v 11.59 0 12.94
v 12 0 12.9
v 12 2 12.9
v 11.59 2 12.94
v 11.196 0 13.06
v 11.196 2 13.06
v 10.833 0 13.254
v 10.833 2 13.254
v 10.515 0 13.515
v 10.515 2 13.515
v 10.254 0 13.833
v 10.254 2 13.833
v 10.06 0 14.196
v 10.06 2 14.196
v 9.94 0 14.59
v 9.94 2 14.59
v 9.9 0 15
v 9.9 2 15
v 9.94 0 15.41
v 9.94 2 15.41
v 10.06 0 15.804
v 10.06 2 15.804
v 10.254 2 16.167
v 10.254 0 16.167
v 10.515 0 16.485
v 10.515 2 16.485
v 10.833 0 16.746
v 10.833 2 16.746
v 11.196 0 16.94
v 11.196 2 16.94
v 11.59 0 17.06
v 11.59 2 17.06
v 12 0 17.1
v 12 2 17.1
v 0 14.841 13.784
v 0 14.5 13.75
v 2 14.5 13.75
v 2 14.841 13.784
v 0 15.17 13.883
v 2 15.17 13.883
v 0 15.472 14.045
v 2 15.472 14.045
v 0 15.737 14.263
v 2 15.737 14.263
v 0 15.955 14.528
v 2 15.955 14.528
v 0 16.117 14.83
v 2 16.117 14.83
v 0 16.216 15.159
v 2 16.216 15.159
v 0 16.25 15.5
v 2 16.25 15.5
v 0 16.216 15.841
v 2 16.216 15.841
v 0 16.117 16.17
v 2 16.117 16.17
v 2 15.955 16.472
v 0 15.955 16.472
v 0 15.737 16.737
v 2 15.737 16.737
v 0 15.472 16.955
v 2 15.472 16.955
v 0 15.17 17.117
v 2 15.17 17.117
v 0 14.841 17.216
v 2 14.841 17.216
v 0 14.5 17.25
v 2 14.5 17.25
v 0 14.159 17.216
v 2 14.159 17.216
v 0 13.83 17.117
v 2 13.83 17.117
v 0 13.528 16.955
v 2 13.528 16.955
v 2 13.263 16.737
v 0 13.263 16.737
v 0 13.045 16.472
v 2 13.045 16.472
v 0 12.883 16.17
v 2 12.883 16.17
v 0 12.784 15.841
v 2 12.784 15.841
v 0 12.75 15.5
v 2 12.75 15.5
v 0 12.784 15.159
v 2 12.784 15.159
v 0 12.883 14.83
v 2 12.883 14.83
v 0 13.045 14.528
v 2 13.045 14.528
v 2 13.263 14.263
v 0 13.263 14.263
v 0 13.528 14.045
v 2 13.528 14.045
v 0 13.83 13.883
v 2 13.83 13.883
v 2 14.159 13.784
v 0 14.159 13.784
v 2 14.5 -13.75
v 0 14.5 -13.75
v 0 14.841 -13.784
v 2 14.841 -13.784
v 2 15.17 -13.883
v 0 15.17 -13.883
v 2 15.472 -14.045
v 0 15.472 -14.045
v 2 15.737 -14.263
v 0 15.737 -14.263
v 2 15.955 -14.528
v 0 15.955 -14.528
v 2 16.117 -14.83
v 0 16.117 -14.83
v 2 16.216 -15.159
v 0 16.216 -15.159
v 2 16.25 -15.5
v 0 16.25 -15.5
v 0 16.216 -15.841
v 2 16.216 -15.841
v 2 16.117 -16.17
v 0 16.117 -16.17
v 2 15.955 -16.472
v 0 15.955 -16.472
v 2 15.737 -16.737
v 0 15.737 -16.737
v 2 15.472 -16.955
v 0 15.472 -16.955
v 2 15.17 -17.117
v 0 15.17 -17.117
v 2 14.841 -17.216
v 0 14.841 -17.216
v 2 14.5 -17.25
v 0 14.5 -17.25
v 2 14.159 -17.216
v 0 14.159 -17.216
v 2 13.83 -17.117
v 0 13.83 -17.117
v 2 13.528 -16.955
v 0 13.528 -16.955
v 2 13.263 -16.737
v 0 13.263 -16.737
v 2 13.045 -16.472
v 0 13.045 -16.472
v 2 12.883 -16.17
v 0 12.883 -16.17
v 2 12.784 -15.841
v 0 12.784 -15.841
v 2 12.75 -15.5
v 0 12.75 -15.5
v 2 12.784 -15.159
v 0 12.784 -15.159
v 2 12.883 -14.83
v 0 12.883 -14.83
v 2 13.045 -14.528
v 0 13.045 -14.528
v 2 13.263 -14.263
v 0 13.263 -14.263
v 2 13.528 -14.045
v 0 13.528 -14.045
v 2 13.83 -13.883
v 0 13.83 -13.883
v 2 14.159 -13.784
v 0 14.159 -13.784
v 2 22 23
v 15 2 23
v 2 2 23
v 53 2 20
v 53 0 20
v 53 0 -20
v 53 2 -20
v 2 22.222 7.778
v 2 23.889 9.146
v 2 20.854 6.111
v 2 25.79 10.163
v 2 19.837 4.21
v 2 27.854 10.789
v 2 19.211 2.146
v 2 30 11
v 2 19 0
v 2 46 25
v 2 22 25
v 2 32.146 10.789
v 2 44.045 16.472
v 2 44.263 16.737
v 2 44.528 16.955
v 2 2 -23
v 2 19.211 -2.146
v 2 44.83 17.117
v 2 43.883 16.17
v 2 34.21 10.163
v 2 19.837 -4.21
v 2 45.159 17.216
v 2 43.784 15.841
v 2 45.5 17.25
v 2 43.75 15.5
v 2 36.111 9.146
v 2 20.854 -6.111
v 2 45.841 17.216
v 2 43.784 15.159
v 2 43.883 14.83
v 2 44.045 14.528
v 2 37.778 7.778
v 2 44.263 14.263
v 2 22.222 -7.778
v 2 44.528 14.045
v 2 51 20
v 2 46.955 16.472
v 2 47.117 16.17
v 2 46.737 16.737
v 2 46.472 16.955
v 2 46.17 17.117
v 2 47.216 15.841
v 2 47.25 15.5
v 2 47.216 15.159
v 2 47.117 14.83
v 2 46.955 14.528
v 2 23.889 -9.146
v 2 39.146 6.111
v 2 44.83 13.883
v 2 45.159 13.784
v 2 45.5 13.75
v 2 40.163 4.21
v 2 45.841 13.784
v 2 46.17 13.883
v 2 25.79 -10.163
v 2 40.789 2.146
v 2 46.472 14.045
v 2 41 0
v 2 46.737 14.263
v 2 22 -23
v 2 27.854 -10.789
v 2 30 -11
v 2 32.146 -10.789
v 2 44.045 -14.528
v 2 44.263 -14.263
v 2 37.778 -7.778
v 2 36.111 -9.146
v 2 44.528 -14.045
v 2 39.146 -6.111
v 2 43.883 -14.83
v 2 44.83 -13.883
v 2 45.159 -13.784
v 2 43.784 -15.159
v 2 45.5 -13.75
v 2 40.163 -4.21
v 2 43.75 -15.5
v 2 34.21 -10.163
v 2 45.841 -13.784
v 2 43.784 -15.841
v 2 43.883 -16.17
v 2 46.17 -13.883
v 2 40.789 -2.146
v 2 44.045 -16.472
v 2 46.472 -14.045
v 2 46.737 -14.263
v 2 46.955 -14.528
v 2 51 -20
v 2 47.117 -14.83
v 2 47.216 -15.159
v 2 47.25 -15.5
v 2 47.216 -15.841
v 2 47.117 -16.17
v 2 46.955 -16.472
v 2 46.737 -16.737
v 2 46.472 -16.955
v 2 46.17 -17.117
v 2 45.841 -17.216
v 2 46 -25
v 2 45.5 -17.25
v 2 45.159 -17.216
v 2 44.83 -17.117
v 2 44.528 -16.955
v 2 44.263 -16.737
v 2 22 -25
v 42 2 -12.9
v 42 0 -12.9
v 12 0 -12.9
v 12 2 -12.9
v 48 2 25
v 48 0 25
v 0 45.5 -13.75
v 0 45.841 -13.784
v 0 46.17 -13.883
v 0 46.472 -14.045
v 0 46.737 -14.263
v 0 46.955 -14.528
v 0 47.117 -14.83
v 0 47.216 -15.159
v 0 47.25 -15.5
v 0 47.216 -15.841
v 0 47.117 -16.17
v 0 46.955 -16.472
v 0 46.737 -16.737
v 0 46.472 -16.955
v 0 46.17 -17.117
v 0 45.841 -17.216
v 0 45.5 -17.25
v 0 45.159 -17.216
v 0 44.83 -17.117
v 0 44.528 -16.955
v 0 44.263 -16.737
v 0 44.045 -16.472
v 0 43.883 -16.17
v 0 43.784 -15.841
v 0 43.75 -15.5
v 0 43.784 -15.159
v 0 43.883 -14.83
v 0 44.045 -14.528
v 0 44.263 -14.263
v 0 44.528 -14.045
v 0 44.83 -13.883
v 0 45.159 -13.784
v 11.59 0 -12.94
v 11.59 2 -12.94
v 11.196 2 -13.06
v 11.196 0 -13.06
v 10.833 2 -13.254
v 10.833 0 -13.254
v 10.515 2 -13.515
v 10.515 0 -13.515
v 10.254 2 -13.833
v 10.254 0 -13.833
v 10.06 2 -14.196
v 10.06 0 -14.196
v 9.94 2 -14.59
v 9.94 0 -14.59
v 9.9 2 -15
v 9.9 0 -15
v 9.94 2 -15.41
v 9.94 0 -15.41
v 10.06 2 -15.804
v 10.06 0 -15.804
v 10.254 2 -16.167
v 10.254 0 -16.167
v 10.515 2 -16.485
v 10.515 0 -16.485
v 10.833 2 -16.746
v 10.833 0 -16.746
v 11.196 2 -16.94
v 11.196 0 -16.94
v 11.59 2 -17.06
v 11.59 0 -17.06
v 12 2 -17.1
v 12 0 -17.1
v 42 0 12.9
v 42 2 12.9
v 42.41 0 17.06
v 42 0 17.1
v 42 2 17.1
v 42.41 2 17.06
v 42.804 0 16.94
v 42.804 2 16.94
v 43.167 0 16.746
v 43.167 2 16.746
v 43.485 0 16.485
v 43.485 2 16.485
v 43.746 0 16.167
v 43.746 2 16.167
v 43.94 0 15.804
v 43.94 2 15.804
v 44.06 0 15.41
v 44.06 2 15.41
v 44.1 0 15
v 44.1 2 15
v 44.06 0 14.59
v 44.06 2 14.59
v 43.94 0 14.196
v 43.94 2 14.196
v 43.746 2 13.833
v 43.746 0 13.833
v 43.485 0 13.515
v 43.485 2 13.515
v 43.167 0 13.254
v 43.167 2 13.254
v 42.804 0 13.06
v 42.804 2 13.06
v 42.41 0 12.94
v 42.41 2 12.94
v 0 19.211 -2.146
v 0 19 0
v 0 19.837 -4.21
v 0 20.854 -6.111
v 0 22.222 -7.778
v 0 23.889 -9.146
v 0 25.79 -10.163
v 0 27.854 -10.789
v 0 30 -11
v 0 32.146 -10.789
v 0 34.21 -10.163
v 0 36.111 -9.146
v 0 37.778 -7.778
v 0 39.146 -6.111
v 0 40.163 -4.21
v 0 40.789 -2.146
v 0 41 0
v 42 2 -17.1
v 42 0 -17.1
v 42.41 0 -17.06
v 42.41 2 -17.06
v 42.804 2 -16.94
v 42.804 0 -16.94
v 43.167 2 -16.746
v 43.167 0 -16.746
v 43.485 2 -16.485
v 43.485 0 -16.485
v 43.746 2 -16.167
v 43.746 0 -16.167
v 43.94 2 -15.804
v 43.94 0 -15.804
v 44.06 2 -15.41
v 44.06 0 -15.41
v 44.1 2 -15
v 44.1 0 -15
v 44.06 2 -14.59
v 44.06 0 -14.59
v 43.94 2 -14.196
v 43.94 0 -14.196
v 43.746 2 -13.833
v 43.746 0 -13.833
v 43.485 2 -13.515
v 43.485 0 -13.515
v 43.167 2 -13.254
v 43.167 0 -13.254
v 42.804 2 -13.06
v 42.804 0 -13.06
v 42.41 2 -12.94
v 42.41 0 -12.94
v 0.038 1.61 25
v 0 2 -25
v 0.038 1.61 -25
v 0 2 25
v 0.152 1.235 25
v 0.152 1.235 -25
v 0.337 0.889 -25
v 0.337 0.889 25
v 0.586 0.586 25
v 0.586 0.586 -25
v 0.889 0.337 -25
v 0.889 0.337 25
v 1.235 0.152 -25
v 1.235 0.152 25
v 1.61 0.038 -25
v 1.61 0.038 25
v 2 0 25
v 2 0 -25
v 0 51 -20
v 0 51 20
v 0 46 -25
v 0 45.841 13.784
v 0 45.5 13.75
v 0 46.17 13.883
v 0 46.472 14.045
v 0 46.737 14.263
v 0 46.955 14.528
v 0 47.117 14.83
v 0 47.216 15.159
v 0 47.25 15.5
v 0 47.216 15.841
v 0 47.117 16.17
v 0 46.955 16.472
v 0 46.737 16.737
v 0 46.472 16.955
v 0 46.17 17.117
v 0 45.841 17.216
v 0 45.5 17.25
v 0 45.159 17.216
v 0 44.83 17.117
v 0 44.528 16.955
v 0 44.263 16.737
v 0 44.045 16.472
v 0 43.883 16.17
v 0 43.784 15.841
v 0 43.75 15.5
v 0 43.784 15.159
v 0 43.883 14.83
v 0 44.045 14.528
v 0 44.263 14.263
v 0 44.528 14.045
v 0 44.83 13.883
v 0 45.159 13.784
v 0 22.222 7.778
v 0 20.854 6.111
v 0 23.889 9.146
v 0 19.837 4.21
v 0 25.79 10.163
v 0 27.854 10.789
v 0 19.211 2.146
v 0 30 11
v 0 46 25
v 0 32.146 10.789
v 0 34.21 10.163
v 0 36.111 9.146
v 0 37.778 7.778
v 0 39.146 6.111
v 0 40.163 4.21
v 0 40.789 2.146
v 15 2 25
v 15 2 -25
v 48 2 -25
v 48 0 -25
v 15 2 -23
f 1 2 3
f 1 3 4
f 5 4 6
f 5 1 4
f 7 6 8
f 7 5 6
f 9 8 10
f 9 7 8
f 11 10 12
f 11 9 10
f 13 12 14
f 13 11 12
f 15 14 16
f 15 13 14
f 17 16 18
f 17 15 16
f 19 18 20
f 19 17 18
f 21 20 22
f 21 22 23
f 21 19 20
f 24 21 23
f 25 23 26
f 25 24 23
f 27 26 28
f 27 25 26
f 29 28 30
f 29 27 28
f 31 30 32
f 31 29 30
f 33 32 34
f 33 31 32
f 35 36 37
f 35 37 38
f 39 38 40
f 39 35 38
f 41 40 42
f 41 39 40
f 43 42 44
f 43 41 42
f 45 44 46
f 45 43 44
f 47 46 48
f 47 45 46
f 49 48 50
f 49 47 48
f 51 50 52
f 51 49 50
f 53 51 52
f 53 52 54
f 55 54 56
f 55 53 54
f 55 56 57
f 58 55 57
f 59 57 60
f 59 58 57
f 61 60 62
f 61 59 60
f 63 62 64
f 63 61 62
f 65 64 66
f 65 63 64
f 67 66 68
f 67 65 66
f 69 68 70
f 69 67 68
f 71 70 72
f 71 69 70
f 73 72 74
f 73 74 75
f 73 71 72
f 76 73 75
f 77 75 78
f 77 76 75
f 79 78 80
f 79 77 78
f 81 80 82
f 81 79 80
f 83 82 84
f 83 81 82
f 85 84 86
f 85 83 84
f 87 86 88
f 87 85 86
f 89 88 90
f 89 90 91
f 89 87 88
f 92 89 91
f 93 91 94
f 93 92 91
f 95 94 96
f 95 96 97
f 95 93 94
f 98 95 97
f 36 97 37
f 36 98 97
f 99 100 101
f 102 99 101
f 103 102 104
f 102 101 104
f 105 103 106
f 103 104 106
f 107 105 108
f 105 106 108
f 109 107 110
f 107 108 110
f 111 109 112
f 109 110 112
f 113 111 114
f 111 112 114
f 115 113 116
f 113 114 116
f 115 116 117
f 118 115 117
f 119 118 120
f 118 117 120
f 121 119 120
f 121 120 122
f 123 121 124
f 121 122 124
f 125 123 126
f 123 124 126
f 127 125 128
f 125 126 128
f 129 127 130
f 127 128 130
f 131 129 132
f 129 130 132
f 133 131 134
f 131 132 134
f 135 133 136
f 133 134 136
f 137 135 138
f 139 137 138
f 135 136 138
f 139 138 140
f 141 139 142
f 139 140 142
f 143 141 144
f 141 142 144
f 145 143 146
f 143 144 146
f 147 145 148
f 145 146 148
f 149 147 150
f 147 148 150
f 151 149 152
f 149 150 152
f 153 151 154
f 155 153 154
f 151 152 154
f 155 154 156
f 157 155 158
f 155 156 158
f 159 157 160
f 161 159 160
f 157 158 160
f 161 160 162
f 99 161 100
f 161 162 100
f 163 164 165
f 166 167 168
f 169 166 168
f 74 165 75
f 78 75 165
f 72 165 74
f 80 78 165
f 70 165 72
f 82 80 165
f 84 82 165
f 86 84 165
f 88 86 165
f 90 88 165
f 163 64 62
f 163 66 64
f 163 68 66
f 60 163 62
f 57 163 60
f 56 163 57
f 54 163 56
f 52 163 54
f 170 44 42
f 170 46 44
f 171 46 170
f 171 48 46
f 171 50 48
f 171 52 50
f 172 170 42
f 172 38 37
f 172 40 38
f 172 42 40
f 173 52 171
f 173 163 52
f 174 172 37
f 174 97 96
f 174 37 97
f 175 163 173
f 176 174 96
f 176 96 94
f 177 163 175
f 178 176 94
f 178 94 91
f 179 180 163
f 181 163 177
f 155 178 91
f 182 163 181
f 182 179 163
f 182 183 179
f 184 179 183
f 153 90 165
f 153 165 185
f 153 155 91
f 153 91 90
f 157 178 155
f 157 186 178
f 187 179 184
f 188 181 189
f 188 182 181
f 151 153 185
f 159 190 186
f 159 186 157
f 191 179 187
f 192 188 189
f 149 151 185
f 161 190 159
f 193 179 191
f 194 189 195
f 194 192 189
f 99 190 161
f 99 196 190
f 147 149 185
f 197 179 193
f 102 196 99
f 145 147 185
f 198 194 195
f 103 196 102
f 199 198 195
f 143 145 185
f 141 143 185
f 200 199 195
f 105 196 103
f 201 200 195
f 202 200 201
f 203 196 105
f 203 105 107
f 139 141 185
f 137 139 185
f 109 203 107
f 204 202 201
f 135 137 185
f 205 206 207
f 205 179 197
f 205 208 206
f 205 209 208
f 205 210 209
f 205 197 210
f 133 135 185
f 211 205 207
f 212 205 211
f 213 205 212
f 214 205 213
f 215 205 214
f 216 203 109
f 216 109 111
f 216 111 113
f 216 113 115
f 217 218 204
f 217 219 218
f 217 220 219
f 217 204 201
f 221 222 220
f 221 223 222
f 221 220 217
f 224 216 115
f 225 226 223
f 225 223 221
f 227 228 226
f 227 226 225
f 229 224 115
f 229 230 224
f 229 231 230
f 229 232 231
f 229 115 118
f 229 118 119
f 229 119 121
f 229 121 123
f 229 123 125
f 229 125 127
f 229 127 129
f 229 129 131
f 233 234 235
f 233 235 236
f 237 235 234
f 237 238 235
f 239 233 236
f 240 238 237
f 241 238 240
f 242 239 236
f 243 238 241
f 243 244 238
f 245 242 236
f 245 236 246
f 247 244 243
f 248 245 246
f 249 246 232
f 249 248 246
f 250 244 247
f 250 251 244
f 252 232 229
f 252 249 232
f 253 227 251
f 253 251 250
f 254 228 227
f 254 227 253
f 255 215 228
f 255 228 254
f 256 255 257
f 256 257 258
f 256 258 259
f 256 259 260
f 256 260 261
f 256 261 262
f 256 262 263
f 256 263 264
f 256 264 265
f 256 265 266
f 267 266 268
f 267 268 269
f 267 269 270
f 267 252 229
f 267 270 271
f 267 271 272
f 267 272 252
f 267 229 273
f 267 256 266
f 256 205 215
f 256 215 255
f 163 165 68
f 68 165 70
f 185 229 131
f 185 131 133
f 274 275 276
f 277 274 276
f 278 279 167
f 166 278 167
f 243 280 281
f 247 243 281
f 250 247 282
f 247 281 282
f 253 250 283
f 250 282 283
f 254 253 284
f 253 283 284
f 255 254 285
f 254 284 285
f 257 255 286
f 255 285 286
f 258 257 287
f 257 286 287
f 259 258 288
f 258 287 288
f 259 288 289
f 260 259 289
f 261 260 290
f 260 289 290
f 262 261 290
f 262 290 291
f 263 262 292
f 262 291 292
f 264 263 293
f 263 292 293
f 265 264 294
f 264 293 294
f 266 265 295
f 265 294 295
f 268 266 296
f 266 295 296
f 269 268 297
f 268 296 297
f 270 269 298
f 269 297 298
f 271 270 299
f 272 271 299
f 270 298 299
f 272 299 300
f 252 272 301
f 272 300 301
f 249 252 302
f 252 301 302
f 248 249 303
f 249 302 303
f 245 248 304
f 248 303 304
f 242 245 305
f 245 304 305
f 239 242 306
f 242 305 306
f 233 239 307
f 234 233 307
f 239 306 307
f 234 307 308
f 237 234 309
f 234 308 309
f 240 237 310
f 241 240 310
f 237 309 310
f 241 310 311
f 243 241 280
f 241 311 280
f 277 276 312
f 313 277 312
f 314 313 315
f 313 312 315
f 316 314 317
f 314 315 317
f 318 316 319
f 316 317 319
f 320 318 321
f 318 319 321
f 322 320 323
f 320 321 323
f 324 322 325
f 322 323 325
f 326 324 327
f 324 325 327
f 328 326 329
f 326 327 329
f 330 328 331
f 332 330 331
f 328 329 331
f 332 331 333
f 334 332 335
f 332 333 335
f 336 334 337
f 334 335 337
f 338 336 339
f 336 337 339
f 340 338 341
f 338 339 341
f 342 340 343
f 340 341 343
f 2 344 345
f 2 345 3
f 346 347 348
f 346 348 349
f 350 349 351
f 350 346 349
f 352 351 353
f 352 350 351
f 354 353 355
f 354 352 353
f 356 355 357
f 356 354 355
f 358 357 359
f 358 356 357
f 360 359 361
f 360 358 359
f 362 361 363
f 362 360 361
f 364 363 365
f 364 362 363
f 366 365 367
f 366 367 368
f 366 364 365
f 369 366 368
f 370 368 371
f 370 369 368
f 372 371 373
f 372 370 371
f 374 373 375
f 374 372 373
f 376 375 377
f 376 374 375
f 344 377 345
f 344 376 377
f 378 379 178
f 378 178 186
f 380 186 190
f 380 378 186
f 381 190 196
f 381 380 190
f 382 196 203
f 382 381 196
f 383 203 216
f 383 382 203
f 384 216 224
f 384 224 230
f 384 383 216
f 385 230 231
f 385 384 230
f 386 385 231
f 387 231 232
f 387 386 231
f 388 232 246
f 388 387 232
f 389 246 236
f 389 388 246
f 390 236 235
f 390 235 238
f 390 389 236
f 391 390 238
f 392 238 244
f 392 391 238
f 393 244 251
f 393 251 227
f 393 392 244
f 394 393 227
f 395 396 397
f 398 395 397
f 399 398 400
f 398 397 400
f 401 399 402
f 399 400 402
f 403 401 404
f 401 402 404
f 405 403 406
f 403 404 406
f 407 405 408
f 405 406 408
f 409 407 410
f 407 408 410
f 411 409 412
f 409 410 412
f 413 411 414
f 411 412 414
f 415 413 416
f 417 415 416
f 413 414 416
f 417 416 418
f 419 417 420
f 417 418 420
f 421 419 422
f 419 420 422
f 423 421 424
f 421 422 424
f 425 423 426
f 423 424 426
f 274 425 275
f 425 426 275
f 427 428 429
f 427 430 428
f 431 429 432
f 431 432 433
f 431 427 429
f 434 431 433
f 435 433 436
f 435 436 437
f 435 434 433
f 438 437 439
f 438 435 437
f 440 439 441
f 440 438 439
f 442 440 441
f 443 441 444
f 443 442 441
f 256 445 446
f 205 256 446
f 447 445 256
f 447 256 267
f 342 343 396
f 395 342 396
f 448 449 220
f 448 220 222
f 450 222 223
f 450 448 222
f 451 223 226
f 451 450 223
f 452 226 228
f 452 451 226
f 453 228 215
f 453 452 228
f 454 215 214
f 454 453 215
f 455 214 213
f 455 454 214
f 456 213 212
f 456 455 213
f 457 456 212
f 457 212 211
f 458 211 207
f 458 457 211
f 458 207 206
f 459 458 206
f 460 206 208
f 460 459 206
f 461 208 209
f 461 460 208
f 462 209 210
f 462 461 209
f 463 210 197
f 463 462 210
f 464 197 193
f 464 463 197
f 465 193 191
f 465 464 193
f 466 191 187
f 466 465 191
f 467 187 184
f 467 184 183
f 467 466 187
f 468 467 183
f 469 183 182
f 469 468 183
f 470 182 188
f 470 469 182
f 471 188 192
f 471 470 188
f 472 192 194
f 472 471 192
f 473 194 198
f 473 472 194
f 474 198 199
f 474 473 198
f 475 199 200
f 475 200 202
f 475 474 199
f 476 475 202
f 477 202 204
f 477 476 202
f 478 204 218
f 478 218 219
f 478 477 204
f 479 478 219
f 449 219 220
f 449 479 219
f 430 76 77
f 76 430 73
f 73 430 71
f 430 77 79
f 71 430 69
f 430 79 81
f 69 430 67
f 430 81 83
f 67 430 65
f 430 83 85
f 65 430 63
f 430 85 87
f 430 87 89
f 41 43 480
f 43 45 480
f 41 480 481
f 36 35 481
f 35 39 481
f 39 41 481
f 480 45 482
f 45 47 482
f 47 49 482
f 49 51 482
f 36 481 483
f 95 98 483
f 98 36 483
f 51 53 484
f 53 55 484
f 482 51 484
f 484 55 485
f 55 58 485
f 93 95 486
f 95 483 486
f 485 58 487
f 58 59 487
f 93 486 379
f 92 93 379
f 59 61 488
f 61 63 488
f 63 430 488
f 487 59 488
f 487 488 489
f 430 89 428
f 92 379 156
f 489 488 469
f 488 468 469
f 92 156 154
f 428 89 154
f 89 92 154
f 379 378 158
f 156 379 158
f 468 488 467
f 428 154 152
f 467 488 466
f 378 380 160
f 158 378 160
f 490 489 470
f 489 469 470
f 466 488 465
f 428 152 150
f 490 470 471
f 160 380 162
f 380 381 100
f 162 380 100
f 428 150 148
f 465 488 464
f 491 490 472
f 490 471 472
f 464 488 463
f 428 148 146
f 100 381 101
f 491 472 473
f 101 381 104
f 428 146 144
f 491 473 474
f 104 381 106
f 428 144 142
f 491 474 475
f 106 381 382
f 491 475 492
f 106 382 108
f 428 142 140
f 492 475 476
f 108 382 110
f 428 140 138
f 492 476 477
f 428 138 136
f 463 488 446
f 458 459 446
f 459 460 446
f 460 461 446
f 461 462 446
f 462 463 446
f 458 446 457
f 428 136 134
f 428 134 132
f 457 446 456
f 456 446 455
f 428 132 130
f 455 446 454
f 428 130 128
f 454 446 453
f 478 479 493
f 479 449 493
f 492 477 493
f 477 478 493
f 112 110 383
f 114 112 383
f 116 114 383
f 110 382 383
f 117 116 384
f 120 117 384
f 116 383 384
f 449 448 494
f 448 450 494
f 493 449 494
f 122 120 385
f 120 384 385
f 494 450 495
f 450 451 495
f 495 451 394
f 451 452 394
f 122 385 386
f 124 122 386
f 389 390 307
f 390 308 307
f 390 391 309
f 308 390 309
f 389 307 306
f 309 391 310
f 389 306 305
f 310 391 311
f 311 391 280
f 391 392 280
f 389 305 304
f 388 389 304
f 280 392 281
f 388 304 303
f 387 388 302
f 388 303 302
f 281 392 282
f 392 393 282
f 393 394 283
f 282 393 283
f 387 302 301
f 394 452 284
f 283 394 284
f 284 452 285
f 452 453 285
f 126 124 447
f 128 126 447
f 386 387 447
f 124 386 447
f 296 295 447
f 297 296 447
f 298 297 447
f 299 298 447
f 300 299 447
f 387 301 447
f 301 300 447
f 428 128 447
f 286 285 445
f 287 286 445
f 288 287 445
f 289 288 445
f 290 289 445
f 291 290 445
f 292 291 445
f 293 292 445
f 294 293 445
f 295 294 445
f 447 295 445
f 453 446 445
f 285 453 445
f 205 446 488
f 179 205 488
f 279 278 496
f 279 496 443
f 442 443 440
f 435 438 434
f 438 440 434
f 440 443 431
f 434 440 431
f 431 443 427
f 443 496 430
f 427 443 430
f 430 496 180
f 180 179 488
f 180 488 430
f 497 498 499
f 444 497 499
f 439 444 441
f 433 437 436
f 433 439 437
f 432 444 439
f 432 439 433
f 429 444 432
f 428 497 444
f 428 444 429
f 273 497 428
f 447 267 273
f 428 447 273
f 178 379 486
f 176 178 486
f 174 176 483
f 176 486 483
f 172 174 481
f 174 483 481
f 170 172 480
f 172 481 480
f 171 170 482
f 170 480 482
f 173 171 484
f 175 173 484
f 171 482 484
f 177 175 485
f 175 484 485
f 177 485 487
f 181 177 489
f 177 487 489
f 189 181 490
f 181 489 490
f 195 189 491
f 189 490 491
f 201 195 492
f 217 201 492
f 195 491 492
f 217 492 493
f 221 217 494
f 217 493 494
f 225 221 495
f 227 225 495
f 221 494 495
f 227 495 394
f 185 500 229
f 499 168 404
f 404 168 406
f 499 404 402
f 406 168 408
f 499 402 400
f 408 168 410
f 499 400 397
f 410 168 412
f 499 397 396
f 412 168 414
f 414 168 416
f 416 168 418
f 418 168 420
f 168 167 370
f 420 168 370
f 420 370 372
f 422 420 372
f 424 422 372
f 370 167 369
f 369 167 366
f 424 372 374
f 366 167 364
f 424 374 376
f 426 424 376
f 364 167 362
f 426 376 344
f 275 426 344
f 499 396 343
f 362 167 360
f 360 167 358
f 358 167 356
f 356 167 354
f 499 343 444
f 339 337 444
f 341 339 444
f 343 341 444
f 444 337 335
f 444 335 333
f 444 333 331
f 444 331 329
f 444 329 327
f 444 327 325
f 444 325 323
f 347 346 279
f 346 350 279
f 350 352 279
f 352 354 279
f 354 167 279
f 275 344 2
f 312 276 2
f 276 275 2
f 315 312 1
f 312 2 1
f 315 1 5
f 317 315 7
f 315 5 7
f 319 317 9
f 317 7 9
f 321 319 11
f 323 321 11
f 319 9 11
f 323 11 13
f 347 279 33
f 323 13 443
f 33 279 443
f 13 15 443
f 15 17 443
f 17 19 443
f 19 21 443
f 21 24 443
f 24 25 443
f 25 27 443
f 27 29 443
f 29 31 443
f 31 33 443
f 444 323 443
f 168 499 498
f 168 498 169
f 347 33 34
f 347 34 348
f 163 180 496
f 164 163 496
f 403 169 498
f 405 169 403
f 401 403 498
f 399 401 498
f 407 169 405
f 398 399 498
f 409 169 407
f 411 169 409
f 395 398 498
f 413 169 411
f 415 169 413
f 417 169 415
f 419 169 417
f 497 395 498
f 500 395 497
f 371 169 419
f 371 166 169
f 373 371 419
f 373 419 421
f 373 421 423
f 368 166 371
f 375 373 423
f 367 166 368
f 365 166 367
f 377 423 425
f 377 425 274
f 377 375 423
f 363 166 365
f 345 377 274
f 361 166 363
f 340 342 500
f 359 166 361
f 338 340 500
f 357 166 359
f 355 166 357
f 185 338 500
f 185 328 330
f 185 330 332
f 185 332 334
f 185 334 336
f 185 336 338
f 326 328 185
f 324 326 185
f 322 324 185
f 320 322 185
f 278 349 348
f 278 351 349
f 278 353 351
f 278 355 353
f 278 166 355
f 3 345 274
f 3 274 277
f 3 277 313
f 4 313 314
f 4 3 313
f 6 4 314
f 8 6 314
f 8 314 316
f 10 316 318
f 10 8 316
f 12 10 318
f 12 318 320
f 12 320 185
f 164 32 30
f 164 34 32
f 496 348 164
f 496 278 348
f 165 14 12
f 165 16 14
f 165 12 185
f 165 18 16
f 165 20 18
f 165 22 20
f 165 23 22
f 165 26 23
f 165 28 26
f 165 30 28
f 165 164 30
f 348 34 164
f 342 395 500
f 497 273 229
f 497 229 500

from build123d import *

# Parameters (mm, degrees)
EXTRUDE_1_DEPTH = 2
SKETCH_2_R      = 1.75
EXTRUDE_2_DEPTH = 2
FILLET_1_R      = 2
EXTRUDE_3_DEPTH = 2


with BuildPart() as part:
    # 草图1 → 凸台-拉伸1 (new body)
    with BuildSketch(Plane(origin=(0, 0, 0), x_dir=(1, 0, 0), z_dir=(0, 1, 0))):
        Polygon((0, 0), (0, 25), (48, 25), (53, 20), (53, 0), align=None)
        with BuildLine():
            Line((12, 17.1), (42, 17.1))
            ThreePointArc((42, 17.1), (44.1, 15), (42, 12.9))
            Line((42, 12.9), (12, 12.9))
            ThreePointArc((12, 12.9), (9.9, 15), (12, 17.1))
        make_face(mode=Mode.SUBTRACT)
    extrude_1 = extrude(amount=EXTRUDE_1_DEPTH)

    # 草图2 → 凸台-拉伸2 (add)
    with BuildSketch(Plane.ZY):
        with BuildLine():
            Line((-25, 46), (-25, 2))
            Line((-25, 2), (0, 2))
            Line((0, 2), (0, 19))
            ThreePointArc((0, 19), (-11, 30), (0, 41))
            Line((0, 41), (0, 51))
            Line((0, 51), (-20, 51))
            Line((-20, 51), (-25, 46))
        make_face()
        with Locations((-15.5, 14.5)):
            Circle(SKETCH_2_R, mode=Mode.SUBTRACT)
        with Locations((-15.5, 45.5)):
            Circle(SKETCH_2_R, mode=Mode.SUBTRACT)
    extrude_2 = extrude(amount=-EXTRUDE_2_DEPTH)

    # 镜向2: 凸台-拉伸1, 凸台-拉伸2 across plane
    add(extrude_1.mirror(Plane.XY))
    add(extrude_2.mirror(Plane.XY))

    # 圆角1
    fillet_1_edges = [part.edges().sort_by_distance(p)[0] for p in [
        (0, 0, 0),
    ]]
    fillet(fillet_1_edges, radius=FILLET_1_R)

    # 草图4 → 凸台-拉伸3 (add)
    with BuildSketch(Plane.XY.offset(25)):
        Polygon((2, 2), (2, 22), (15, 2), align=None)
    extrude_3 = extrude(amount=-EXTRUDE_3_DEPTH)

    # 镜向4: 凸台-拉伸3 across plane
    add(extrude_3.mirror(Plane.XY))


solid = part.part
